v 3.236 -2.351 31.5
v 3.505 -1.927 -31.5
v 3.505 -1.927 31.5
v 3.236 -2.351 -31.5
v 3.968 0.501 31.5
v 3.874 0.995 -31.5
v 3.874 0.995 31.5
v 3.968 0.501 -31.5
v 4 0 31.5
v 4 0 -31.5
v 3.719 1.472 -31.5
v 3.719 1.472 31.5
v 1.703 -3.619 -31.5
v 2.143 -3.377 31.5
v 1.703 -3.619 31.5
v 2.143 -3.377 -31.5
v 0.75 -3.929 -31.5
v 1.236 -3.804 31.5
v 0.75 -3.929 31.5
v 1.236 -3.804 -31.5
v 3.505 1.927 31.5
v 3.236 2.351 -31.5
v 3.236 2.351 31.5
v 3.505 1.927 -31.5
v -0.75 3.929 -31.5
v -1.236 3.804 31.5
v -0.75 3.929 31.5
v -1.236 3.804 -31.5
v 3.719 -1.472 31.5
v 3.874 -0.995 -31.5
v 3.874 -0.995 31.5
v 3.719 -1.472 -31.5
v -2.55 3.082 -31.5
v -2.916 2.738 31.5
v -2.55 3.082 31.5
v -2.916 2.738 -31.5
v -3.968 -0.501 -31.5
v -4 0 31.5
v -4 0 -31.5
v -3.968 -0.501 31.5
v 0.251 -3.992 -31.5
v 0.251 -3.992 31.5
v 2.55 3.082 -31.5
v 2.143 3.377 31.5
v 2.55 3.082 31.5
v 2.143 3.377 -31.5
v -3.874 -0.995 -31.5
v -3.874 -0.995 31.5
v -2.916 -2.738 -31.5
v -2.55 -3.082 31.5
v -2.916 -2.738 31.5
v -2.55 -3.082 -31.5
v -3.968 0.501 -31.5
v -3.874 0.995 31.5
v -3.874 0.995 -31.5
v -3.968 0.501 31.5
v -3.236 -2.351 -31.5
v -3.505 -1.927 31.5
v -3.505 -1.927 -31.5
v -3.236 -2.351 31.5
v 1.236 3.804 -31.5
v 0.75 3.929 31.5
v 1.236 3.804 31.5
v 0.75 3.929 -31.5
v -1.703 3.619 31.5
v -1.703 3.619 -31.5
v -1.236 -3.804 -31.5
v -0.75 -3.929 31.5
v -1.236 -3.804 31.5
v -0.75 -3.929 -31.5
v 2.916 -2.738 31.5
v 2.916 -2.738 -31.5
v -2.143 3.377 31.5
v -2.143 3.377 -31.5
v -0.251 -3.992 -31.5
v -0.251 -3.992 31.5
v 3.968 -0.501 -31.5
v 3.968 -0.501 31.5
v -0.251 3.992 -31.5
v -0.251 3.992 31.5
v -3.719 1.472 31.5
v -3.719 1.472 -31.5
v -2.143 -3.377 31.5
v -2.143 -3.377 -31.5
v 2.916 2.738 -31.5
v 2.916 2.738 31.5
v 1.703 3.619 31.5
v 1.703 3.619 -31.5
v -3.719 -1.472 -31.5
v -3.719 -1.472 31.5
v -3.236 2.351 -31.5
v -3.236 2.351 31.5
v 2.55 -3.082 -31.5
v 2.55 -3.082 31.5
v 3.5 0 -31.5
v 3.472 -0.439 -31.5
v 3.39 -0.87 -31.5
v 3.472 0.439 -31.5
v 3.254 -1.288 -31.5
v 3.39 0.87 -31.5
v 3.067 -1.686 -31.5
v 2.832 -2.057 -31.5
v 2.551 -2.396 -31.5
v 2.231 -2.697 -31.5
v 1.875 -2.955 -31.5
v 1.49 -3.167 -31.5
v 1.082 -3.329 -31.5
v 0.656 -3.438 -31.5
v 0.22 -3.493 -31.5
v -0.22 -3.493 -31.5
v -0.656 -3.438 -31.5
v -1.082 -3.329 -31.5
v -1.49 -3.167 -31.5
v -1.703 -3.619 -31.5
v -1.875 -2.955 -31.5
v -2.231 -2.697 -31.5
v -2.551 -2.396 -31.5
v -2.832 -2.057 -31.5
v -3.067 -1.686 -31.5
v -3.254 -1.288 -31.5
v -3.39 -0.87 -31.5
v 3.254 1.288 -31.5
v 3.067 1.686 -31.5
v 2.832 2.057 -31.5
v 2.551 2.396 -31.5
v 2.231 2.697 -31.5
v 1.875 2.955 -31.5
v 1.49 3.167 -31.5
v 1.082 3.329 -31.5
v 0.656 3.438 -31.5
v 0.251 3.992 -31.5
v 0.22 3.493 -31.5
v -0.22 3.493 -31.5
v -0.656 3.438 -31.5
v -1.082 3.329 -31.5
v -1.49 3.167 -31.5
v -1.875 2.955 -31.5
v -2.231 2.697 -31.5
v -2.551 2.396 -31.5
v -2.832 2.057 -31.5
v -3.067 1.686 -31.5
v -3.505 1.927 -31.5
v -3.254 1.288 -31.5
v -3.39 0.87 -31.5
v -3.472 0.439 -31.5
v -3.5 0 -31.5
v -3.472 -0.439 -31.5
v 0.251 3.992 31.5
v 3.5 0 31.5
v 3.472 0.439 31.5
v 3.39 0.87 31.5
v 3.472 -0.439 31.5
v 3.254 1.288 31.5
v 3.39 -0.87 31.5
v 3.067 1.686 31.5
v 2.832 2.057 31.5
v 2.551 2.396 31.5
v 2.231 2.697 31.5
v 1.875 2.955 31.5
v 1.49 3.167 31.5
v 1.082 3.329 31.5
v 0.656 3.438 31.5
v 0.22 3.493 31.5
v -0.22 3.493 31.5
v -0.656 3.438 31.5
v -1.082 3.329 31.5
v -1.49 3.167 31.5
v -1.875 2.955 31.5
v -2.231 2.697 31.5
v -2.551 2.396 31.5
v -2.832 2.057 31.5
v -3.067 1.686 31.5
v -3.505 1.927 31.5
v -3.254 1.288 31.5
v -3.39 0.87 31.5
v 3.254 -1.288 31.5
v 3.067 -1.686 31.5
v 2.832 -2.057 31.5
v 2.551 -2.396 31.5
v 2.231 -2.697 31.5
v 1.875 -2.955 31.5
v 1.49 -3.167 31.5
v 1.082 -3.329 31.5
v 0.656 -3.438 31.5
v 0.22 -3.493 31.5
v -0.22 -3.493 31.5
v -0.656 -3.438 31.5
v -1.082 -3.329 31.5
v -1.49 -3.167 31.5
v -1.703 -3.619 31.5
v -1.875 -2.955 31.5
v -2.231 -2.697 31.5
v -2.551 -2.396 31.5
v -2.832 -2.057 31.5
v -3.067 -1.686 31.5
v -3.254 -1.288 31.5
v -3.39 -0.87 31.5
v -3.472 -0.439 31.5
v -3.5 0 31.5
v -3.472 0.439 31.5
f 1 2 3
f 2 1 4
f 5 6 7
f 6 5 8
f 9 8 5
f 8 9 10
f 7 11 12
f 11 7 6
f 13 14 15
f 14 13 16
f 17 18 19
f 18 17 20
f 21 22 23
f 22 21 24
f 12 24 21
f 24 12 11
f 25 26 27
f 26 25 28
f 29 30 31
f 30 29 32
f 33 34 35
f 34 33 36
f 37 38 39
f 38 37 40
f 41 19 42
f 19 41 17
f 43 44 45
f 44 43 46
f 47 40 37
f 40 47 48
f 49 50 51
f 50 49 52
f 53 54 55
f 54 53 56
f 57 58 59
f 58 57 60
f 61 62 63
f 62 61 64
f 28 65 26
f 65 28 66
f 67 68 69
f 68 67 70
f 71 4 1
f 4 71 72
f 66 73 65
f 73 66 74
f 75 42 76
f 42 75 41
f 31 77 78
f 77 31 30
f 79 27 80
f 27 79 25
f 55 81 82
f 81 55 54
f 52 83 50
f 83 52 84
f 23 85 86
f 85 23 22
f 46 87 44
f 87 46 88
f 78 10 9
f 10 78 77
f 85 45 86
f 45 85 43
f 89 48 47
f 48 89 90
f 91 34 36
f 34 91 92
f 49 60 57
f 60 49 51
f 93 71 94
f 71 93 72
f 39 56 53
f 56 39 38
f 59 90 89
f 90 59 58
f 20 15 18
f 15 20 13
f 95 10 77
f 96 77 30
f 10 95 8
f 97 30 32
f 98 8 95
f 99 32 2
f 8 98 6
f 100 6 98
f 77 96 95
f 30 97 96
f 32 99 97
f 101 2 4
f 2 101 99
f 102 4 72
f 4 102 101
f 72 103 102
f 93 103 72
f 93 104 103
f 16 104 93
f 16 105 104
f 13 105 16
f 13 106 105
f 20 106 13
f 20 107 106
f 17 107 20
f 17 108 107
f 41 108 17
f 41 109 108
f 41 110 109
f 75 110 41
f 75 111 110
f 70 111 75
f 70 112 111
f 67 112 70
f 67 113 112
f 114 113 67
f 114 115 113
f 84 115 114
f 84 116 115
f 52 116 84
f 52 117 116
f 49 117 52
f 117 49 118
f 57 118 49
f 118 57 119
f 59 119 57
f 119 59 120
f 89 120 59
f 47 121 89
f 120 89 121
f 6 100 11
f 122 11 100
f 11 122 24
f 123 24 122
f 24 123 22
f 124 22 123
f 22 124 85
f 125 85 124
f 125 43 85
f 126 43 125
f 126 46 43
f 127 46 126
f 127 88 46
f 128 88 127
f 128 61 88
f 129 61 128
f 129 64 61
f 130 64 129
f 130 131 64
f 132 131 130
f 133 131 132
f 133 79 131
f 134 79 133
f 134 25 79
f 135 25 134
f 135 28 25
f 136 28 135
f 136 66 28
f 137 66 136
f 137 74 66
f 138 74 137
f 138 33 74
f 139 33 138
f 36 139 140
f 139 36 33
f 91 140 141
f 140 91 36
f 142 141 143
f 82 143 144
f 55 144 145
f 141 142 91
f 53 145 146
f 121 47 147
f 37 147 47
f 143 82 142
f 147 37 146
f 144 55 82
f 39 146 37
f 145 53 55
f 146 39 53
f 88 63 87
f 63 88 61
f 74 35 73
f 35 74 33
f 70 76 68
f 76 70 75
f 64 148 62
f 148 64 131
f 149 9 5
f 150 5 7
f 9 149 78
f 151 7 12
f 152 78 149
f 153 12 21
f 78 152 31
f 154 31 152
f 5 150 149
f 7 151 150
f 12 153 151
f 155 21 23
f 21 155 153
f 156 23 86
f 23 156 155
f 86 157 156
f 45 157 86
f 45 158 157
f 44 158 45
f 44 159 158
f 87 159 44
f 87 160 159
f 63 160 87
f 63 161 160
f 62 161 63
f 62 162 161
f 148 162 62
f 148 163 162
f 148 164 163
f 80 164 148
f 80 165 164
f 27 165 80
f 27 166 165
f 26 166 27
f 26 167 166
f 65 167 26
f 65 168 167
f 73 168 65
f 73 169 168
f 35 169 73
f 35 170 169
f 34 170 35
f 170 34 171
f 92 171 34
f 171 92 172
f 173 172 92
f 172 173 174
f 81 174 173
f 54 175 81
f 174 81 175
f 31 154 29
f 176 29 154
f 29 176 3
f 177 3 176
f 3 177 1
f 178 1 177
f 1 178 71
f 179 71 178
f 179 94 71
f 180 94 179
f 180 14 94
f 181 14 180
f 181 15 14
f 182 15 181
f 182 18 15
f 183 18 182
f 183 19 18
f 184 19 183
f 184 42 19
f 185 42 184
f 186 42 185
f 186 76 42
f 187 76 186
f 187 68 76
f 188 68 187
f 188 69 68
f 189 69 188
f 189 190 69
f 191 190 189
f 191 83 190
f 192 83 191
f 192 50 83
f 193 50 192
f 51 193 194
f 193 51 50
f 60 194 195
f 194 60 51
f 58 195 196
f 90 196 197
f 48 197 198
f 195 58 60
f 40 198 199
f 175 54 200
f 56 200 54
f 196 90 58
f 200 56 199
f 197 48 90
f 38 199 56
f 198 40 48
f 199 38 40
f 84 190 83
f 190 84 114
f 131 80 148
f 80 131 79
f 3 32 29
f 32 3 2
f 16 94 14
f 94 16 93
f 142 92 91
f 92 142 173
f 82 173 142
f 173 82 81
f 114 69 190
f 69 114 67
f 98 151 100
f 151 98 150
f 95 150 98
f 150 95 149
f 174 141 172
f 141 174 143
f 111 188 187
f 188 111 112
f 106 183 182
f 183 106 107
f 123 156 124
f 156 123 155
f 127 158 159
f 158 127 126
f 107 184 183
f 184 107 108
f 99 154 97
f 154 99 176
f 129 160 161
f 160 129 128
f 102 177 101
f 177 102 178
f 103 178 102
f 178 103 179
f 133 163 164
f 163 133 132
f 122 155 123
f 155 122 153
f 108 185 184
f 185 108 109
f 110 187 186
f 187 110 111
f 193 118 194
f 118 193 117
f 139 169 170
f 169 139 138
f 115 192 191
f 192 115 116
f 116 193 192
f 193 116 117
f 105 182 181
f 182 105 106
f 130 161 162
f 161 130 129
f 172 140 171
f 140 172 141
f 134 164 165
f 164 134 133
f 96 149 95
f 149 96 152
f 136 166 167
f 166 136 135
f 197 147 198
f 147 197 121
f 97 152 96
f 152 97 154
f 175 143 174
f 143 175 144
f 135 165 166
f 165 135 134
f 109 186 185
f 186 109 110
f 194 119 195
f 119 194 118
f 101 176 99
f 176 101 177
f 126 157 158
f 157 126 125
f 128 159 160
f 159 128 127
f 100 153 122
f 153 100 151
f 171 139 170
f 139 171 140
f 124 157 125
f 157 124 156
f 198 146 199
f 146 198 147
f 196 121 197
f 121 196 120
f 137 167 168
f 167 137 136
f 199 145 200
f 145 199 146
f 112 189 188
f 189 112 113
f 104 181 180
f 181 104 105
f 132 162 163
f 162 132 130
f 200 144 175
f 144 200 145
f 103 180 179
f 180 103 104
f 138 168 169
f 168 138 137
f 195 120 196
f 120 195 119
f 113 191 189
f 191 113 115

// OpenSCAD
$fn = 50;


difference() {
	union() {
		translate(v = [0, 0, -31.5000000000]) {
			cylinder(h = 63, r = 4.0000000000);
		}
	}
	union() {
		translate(v = [0, 0, -100.0000000000]) {
			cylinder(h = 200, r = 3.5000000000);
		}
	}
}
